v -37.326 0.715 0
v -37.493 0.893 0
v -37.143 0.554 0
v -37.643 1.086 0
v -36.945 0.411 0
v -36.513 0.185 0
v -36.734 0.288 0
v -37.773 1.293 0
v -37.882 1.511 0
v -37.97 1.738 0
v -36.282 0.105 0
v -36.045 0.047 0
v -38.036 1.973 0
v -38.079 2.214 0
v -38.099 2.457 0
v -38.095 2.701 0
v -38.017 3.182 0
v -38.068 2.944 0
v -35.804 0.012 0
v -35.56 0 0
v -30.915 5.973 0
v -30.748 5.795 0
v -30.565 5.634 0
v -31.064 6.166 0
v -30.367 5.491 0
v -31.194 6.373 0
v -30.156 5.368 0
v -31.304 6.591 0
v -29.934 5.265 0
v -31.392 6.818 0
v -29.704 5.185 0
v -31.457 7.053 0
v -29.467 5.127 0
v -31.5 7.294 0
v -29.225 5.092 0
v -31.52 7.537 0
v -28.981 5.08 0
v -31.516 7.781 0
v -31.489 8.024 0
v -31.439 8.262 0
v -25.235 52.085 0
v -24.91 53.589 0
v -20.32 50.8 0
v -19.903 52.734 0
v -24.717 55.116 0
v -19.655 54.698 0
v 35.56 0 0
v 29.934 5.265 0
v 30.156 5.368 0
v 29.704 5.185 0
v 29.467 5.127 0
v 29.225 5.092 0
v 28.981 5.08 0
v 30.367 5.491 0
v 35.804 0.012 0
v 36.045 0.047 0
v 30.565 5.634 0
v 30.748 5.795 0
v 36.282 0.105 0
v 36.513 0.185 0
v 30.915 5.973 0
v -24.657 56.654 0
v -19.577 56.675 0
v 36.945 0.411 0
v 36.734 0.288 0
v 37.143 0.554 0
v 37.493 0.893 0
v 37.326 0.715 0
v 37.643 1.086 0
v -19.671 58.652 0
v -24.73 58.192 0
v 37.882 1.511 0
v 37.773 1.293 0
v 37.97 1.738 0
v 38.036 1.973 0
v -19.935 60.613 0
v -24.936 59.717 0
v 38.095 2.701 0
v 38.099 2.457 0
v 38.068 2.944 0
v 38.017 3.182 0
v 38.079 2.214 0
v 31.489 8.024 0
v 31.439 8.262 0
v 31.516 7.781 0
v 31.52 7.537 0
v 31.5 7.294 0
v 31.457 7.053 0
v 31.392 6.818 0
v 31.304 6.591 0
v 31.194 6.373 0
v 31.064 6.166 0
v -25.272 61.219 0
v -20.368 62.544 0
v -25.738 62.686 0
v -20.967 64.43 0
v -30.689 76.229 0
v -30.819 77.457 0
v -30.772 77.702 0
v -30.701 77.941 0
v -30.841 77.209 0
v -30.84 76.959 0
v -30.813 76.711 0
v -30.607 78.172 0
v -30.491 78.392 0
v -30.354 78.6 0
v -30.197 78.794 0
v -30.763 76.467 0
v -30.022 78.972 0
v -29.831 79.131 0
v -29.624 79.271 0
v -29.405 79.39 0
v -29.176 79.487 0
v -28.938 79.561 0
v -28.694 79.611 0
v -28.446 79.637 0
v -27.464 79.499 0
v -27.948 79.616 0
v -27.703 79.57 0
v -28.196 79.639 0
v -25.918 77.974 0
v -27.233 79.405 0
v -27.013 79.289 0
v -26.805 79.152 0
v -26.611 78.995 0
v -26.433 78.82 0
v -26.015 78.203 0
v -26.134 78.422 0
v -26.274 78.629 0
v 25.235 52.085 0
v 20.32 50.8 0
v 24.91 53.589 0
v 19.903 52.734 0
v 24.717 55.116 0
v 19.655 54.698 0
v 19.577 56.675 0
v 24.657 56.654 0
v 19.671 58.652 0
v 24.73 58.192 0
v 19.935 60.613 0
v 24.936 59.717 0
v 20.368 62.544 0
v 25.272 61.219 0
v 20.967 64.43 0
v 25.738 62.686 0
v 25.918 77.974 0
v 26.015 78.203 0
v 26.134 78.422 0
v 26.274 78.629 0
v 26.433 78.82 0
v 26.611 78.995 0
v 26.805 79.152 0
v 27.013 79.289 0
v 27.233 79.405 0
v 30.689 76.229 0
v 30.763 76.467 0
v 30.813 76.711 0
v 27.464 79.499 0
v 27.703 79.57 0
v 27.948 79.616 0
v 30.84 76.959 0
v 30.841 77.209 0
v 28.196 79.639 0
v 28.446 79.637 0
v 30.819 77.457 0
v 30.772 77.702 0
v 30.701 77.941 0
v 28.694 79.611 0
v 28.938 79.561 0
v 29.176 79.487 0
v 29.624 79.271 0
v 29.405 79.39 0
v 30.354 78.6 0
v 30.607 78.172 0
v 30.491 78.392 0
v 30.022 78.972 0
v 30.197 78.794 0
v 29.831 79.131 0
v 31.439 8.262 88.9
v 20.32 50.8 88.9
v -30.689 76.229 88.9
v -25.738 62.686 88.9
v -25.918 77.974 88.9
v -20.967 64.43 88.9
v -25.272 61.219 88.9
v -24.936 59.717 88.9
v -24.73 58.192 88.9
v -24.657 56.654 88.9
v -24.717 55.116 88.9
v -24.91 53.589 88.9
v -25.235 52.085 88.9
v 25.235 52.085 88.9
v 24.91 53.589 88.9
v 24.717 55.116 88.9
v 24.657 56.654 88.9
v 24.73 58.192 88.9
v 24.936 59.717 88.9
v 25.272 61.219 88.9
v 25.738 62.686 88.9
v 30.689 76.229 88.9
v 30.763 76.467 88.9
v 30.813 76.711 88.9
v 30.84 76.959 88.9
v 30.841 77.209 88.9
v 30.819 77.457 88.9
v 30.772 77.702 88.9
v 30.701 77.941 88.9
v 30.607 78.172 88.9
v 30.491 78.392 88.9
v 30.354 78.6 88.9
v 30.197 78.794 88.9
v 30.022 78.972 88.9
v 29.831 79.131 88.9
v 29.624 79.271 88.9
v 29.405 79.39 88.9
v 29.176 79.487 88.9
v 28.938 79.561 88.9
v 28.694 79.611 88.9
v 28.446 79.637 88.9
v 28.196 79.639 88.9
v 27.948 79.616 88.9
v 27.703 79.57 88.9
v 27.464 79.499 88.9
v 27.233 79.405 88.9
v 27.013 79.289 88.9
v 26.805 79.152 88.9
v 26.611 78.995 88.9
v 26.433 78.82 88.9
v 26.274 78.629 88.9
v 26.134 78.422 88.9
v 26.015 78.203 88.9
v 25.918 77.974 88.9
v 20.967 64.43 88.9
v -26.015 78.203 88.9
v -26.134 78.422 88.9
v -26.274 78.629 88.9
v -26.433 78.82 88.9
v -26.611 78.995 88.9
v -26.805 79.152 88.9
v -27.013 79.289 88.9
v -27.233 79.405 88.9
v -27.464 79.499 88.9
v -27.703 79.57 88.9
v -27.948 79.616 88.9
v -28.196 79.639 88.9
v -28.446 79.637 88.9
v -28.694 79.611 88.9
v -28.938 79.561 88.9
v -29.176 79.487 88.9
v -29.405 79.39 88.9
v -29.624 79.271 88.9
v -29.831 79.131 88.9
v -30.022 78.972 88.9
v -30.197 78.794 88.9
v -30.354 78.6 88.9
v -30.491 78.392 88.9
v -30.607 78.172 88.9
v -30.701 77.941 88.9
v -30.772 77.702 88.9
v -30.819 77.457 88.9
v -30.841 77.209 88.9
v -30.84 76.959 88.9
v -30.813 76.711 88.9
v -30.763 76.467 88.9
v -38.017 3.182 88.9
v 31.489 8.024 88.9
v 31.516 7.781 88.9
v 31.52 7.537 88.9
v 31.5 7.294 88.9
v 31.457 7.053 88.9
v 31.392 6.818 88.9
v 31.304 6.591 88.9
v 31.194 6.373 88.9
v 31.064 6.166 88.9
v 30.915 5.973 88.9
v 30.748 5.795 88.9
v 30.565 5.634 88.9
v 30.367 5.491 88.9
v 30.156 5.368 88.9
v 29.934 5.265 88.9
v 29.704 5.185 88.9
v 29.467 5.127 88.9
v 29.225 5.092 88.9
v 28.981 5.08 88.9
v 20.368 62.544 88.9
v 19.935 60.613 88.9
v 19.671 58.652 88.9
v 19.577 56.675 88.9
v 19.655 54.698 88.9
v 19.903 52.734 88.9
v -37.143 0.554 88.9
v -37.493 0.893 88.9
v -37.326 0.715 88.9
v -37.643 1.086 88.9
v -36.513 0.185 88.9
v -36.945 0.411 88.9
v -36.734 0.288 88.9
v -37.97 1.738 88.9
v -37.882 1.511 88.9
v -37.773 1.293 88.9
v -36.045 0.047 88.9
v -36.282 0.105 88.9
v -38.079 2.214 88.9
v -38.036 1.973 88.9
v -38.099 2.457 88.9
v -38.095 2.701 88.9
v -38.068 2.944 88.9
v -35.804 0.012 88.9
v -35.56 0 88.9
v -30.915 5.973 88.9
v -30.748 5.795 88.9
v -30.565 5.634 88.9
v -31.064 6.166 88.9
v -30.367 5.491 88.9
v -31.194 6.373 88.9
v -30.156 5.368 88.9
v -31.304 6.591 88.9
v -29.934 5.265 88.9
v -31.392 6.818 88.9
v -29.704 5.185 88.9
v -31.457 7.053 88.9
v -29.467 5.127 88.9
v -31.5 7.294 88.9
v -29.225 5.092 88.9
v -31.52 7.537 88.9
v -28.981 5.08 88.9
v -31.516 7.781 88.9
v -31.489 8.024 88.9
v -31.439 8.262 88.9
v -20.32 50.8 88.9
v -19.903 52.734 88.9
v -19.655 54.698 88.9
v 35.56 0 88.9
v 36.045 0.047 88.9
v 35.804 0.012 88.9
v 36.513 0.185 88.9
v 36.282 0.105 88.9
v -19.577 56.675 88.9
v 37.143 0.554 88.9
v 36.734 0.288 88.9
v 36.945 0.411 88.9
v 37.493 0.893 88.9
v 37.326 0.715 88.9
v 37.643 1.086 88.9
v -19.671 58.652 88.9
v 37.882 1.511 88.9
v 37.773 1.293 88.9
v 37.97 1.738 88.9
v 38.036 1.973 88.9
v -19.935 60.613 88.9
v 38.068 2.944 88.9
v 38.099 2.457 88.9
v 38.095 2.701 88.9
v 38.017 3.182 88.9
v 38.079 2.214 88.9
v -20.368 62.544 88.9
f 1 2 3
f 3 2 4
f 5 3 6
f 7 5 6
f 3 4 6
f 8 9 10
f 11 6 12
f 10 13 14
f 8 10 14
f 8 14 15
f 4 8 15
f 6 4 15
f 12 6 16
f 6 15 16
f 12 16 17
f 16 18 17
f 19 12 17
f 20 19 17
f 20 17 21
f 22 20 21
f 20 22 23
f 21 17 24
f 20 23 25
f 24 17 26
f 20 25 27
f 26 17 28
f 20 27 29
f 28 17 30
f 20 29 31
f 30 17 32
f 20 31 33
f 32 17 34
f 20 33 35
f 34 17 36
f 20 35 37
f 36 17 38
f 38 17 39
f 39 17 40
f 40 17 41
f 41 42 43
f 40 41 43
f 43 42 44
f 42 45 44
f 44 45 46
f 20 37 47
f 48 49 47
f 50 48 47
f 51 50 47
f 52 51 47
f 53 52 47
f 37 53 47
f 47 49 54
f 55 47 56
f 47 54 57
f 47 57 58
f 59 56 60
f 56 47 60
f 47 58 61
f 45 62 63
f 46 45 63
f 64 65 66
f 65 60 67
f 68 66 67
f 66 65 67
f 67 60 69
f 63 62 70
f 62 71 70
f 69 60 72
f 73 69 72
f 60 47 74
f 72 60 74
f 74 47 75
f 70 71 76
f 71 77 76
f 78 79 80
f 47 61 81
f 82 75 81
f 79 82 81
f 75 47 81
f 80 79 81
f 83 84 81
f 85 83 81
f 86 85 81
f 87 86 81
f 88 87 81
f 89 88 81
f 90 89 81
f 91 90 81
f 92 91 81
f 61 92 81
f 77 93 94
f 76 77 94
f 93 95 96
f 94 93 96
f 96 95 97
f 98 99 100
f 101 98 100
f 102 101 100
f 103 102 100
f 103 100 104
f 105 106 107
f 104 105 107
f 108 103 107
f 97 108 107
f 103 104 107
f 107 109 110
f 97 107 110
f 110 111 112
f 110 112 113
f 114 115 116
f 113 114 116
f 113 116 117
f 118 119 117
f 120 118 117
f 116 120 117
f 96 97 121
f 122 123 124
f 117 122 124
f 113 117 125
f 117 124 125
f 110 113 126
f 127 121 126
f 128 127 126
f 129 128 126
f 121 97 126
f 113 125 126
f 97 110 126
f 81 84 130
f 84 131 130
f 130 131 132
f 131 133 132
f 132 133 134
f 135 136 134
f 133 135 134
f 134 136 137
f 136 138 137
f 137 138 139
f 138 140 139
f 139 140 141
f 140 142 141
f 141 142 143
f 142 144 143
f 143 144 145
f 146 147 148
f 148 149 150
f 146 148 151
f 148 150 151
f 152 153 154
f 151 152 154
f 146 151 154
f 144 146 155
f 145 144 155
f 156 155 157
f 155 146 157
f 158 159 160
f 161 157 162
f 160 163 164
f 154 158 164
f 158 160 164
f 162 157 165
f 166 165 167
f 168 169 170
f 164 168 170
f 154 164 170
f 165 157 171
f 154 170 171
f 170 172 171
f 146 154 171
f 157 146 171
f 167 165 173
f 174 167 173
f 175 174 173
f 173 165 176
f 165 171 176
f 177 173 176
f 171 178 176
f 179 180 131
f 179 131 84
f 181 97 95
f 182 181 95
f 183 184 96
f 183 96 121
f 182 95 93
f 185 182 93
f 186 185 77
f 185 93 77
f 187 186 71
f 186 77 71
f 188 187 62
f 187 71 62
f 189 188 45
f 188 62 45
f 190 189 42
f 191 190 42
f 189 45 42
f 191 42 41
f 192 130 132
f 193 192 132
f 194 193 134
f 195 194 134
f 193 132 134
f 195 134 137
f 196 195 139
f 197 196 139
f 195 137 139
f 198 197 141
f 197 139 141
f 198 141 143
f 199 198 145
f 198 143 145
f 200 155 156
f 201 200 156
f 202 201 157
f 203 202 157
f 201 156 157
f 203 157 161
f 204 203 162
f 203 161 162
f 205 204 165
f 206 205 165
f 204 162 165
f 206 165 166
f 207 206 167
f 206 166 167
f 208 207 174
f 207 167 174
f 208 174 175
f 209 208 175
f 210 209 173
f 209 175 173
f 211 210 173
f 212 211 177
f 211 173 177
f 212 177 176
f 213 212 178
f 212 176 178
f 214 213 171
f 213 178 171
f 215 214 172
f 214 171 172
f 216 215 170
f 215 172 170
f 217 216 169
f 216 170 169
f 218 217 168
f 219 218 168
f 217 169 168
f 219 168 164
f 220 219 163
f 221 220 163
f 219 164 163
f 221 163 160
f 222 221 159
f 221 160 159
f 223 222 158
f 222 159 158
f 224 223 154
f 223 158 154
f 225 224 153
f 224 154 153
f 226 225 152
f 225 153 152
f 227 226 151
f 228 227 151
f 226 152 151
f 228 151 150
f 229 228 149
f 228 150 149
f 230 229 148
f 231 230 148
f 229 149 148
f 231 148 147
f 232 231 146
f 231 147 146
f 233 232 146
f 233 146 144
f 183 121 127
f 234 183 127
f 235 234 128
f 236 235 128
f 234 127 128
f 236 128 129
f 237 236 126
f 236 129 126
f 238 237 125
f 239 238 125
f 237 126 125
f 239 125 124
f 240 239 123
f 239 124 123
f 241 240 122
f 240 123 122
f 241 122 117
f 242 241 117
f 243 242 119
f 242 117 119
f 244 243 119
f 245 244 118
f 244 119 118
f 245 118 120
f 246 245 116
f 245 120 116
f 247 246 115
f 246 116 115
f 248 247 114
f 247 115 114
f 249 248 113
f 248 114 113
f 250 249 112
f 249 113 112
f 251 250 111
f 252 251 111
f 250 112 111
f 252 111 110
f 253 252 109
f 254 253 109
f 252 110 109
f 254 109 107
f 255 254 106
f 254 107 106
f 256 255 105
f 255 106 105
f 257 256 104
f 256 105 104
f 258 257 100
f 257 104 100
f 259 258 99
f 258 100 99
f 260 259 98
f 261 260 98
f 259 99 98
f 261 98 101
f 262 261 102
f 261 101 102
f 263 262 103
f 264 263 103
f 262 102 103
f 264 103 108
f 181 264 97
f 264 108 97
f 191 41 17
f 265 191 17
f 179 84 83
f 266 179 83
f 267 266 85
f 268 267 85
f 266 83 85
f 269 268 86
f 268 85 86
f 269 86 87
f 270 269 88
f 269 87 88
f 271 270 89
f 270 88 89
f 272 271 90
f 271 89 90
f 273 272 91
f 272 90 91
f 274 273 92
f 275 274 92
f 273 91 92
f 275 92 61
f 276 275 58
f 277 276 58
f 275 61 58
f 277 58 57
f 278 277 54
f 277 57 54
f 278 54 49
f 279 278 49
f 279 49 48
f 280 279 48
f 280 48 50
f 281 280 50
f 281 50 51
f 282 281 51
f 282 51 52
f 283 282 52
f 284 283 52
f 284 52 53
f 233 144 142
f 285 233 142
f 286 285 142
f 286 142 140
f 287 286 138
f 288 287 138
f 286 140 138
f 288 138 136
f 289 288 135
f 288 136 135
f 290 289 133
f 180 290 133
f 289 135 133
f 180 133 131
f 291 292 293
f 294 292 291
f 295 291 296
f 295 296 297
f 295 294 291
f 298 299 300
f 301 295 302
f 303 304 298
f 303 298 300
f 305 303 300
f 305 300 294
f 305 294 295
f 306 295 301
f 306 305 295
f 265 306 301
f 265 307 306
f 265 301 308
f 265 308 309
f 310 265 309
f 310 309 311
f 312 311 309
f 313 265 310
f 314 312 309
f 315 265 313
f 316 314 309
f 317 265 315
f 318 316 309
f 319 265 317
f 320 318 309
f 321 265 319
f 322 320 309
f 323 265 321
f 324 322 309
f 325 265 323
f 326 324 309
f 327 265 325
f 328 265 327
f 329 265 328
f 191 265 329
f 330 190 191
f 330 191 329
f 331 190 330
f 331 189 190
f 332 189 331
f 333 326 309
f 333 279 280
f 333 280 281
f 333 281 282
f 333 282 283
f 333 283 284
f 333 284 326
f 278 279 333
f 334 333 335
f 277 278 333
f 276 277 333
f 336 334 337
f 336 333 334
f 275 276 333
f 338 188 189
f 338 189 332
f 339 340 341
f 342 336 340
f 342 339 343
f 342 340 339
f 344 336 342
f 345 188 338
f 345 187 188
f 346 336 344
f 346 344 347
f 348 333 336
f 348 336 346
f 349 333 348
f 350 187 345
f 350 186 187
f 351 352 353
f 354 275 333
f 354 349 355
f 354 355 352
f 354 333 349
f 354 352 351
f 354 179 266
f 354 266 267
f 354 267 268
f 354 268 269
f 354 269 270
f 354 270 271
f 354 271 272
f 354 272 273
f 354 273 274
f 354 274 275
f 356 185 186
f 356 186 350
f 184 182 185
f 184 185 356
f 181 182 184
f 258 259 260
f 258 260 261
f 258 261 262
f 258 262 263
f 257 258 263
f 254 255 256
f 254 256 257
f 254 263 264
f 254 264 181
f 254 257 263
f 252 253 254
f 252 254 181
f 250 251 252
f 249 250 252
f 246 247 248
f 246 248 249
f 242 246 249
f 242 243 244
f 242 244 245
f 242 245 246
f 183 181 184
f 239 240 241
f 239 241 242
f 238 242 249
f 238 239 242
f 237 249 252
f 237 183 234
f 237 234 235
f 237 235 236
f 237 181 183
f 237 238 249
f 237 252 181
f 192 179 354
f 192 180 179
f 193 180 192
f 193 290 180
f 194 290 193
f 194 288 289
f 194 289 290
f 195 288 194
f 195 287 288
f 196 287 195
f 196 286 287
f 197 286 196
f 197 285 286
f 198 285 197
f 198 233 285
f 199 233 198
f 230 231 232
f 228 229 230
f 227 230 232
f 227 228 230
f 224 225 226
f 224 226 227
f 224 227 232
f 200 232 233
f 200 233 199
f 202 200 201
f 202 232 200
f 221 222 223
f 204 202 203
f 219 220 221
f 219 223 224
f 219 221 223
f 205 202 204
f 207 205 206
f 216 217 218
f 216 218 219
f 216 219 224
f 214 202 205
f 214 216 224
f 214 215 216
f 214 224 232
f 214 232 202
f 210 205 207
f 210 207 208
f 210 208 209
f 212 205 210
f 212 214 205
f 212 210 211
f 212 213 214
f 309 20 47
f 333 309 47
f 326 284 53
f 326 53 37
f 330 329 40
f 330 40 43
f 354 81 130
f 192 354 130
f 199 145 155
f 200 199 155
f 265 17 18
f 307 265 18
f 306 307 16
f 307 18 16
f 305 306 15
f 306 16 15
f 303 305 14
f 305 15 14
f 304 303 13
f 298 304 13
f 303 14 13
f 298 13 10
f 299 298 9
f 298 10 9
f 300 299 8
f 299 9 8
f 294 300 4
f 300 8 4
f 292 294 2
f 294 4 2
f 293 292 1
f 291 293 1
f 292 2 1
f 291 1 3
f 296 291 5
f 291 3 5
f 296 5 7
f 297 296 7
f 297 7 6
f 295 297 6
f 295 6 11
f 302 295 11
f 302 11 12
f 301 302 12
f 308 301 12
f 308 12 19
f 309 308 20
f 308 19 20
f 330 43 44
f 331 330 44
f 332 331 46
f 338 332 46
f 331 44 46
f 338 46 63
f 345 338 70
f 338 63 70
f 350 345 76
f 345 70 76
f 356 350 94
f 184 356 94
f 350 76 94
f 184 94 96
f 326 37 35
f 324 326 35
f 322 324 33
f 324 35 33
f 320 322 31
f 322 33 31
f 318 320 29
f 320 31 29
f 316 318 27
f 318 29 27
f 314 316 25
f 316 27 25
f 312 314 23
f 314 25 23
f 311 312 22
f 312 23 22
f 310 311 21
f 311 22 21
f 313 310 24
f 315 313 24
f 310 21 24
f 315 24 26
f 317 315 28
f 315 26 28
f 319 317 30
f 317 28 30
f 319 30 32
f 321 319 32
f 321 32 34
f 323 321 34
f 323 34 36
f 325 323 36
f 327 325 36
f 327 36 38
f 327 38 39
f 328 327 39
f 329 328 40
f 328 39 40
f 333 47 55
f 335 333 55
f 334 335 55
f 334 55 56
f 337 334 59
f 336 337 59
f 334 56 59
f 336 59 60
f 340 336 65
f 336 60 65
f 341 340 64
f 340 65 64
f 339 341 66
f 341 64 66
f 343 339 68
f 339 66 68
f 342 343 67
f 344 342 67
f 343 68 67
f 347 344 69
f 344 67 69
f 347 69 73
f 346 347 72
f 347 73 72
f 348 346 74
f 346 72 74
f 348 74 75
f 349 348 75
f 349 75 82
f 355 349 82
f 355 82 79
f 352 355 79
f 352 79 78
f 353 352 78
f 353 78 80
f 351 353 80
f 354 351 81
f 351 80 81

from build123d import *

# Parameters (mm, degrees)
F1_DEPTH = 88.9


with BuildPart() as f1:
    # F0 (on Top) → F1 (new body)
    with BuildSketch(Plane.XY):
        with BuildLine():
            Line((-35.56, 0), (0, 0))
            Line((0, 0), (35.56, 0))
            ThreePointArc((35.56, 0), (37.570369, 0.987577), (38.017435, 3.182348))
            Line((38.017435, 3.182348), (25.234871, 52.084696))
            ThreePointArc((25.234871, 52.084696), (24.6769, 57.423813), (25.737889, 62.686113))
            Line((25.737889, 62.686113), (30.689125, 76.229293))
            ThreePointArc((30.689125, 76.229293), (29.17569, 79.487009), (25.917974, 77.973574))
            Line((25.917974, 77.973574), (20.966737, 64.430393))
            ThreePointArc((20.966737, 64.430393), (19.602608, 57.664578), (20.32, 50.8))
            Line((20.32, 50.8), (31.438899, 8.262348))
            ThreePointArc((31.438899, 8.262348), (30.991832, 6.067577), (28.981464, 5.08))
            Line((28.981464, 5.08), (0, 5.08))
            Line((0, 5.08), (-28.981464, 5.08))
            ThreePointArc((-28.981464, 5.08), (-30.991832, 6.067577), (-31.438899, 8.262348))
            Line((-31.438899, 8.262348), (-20.32, 50.8))
            ThreePointArc((-20.32, 50.8), (-19.602608, 57.664578), (-20.966737, 64.430393))
            Line((-20.966737, 64.430393), (-25.917974, 77.973574))
            ThreePointArc((-25.917974, 77.973574), (-29.17569, 79.487009), (-30.689125, 76.229293))
            Line((-30.689125, 76.229293), (-25.737889, 62.686113))
            ThreePointArc((-25.737889, 62.686113), (-24.6769, 57.423813), (-25.234871, 52.084696))
            Line((-25.234871, 52.084696), (-38.017435, 3.182348))
            ThreePointArc((-38.017435, 3.182348), (-37.570369, 0.987577), (-35.56, 0))
        make_face()
    extrude(amount=F1_DEPTH)


solid = f1.part
